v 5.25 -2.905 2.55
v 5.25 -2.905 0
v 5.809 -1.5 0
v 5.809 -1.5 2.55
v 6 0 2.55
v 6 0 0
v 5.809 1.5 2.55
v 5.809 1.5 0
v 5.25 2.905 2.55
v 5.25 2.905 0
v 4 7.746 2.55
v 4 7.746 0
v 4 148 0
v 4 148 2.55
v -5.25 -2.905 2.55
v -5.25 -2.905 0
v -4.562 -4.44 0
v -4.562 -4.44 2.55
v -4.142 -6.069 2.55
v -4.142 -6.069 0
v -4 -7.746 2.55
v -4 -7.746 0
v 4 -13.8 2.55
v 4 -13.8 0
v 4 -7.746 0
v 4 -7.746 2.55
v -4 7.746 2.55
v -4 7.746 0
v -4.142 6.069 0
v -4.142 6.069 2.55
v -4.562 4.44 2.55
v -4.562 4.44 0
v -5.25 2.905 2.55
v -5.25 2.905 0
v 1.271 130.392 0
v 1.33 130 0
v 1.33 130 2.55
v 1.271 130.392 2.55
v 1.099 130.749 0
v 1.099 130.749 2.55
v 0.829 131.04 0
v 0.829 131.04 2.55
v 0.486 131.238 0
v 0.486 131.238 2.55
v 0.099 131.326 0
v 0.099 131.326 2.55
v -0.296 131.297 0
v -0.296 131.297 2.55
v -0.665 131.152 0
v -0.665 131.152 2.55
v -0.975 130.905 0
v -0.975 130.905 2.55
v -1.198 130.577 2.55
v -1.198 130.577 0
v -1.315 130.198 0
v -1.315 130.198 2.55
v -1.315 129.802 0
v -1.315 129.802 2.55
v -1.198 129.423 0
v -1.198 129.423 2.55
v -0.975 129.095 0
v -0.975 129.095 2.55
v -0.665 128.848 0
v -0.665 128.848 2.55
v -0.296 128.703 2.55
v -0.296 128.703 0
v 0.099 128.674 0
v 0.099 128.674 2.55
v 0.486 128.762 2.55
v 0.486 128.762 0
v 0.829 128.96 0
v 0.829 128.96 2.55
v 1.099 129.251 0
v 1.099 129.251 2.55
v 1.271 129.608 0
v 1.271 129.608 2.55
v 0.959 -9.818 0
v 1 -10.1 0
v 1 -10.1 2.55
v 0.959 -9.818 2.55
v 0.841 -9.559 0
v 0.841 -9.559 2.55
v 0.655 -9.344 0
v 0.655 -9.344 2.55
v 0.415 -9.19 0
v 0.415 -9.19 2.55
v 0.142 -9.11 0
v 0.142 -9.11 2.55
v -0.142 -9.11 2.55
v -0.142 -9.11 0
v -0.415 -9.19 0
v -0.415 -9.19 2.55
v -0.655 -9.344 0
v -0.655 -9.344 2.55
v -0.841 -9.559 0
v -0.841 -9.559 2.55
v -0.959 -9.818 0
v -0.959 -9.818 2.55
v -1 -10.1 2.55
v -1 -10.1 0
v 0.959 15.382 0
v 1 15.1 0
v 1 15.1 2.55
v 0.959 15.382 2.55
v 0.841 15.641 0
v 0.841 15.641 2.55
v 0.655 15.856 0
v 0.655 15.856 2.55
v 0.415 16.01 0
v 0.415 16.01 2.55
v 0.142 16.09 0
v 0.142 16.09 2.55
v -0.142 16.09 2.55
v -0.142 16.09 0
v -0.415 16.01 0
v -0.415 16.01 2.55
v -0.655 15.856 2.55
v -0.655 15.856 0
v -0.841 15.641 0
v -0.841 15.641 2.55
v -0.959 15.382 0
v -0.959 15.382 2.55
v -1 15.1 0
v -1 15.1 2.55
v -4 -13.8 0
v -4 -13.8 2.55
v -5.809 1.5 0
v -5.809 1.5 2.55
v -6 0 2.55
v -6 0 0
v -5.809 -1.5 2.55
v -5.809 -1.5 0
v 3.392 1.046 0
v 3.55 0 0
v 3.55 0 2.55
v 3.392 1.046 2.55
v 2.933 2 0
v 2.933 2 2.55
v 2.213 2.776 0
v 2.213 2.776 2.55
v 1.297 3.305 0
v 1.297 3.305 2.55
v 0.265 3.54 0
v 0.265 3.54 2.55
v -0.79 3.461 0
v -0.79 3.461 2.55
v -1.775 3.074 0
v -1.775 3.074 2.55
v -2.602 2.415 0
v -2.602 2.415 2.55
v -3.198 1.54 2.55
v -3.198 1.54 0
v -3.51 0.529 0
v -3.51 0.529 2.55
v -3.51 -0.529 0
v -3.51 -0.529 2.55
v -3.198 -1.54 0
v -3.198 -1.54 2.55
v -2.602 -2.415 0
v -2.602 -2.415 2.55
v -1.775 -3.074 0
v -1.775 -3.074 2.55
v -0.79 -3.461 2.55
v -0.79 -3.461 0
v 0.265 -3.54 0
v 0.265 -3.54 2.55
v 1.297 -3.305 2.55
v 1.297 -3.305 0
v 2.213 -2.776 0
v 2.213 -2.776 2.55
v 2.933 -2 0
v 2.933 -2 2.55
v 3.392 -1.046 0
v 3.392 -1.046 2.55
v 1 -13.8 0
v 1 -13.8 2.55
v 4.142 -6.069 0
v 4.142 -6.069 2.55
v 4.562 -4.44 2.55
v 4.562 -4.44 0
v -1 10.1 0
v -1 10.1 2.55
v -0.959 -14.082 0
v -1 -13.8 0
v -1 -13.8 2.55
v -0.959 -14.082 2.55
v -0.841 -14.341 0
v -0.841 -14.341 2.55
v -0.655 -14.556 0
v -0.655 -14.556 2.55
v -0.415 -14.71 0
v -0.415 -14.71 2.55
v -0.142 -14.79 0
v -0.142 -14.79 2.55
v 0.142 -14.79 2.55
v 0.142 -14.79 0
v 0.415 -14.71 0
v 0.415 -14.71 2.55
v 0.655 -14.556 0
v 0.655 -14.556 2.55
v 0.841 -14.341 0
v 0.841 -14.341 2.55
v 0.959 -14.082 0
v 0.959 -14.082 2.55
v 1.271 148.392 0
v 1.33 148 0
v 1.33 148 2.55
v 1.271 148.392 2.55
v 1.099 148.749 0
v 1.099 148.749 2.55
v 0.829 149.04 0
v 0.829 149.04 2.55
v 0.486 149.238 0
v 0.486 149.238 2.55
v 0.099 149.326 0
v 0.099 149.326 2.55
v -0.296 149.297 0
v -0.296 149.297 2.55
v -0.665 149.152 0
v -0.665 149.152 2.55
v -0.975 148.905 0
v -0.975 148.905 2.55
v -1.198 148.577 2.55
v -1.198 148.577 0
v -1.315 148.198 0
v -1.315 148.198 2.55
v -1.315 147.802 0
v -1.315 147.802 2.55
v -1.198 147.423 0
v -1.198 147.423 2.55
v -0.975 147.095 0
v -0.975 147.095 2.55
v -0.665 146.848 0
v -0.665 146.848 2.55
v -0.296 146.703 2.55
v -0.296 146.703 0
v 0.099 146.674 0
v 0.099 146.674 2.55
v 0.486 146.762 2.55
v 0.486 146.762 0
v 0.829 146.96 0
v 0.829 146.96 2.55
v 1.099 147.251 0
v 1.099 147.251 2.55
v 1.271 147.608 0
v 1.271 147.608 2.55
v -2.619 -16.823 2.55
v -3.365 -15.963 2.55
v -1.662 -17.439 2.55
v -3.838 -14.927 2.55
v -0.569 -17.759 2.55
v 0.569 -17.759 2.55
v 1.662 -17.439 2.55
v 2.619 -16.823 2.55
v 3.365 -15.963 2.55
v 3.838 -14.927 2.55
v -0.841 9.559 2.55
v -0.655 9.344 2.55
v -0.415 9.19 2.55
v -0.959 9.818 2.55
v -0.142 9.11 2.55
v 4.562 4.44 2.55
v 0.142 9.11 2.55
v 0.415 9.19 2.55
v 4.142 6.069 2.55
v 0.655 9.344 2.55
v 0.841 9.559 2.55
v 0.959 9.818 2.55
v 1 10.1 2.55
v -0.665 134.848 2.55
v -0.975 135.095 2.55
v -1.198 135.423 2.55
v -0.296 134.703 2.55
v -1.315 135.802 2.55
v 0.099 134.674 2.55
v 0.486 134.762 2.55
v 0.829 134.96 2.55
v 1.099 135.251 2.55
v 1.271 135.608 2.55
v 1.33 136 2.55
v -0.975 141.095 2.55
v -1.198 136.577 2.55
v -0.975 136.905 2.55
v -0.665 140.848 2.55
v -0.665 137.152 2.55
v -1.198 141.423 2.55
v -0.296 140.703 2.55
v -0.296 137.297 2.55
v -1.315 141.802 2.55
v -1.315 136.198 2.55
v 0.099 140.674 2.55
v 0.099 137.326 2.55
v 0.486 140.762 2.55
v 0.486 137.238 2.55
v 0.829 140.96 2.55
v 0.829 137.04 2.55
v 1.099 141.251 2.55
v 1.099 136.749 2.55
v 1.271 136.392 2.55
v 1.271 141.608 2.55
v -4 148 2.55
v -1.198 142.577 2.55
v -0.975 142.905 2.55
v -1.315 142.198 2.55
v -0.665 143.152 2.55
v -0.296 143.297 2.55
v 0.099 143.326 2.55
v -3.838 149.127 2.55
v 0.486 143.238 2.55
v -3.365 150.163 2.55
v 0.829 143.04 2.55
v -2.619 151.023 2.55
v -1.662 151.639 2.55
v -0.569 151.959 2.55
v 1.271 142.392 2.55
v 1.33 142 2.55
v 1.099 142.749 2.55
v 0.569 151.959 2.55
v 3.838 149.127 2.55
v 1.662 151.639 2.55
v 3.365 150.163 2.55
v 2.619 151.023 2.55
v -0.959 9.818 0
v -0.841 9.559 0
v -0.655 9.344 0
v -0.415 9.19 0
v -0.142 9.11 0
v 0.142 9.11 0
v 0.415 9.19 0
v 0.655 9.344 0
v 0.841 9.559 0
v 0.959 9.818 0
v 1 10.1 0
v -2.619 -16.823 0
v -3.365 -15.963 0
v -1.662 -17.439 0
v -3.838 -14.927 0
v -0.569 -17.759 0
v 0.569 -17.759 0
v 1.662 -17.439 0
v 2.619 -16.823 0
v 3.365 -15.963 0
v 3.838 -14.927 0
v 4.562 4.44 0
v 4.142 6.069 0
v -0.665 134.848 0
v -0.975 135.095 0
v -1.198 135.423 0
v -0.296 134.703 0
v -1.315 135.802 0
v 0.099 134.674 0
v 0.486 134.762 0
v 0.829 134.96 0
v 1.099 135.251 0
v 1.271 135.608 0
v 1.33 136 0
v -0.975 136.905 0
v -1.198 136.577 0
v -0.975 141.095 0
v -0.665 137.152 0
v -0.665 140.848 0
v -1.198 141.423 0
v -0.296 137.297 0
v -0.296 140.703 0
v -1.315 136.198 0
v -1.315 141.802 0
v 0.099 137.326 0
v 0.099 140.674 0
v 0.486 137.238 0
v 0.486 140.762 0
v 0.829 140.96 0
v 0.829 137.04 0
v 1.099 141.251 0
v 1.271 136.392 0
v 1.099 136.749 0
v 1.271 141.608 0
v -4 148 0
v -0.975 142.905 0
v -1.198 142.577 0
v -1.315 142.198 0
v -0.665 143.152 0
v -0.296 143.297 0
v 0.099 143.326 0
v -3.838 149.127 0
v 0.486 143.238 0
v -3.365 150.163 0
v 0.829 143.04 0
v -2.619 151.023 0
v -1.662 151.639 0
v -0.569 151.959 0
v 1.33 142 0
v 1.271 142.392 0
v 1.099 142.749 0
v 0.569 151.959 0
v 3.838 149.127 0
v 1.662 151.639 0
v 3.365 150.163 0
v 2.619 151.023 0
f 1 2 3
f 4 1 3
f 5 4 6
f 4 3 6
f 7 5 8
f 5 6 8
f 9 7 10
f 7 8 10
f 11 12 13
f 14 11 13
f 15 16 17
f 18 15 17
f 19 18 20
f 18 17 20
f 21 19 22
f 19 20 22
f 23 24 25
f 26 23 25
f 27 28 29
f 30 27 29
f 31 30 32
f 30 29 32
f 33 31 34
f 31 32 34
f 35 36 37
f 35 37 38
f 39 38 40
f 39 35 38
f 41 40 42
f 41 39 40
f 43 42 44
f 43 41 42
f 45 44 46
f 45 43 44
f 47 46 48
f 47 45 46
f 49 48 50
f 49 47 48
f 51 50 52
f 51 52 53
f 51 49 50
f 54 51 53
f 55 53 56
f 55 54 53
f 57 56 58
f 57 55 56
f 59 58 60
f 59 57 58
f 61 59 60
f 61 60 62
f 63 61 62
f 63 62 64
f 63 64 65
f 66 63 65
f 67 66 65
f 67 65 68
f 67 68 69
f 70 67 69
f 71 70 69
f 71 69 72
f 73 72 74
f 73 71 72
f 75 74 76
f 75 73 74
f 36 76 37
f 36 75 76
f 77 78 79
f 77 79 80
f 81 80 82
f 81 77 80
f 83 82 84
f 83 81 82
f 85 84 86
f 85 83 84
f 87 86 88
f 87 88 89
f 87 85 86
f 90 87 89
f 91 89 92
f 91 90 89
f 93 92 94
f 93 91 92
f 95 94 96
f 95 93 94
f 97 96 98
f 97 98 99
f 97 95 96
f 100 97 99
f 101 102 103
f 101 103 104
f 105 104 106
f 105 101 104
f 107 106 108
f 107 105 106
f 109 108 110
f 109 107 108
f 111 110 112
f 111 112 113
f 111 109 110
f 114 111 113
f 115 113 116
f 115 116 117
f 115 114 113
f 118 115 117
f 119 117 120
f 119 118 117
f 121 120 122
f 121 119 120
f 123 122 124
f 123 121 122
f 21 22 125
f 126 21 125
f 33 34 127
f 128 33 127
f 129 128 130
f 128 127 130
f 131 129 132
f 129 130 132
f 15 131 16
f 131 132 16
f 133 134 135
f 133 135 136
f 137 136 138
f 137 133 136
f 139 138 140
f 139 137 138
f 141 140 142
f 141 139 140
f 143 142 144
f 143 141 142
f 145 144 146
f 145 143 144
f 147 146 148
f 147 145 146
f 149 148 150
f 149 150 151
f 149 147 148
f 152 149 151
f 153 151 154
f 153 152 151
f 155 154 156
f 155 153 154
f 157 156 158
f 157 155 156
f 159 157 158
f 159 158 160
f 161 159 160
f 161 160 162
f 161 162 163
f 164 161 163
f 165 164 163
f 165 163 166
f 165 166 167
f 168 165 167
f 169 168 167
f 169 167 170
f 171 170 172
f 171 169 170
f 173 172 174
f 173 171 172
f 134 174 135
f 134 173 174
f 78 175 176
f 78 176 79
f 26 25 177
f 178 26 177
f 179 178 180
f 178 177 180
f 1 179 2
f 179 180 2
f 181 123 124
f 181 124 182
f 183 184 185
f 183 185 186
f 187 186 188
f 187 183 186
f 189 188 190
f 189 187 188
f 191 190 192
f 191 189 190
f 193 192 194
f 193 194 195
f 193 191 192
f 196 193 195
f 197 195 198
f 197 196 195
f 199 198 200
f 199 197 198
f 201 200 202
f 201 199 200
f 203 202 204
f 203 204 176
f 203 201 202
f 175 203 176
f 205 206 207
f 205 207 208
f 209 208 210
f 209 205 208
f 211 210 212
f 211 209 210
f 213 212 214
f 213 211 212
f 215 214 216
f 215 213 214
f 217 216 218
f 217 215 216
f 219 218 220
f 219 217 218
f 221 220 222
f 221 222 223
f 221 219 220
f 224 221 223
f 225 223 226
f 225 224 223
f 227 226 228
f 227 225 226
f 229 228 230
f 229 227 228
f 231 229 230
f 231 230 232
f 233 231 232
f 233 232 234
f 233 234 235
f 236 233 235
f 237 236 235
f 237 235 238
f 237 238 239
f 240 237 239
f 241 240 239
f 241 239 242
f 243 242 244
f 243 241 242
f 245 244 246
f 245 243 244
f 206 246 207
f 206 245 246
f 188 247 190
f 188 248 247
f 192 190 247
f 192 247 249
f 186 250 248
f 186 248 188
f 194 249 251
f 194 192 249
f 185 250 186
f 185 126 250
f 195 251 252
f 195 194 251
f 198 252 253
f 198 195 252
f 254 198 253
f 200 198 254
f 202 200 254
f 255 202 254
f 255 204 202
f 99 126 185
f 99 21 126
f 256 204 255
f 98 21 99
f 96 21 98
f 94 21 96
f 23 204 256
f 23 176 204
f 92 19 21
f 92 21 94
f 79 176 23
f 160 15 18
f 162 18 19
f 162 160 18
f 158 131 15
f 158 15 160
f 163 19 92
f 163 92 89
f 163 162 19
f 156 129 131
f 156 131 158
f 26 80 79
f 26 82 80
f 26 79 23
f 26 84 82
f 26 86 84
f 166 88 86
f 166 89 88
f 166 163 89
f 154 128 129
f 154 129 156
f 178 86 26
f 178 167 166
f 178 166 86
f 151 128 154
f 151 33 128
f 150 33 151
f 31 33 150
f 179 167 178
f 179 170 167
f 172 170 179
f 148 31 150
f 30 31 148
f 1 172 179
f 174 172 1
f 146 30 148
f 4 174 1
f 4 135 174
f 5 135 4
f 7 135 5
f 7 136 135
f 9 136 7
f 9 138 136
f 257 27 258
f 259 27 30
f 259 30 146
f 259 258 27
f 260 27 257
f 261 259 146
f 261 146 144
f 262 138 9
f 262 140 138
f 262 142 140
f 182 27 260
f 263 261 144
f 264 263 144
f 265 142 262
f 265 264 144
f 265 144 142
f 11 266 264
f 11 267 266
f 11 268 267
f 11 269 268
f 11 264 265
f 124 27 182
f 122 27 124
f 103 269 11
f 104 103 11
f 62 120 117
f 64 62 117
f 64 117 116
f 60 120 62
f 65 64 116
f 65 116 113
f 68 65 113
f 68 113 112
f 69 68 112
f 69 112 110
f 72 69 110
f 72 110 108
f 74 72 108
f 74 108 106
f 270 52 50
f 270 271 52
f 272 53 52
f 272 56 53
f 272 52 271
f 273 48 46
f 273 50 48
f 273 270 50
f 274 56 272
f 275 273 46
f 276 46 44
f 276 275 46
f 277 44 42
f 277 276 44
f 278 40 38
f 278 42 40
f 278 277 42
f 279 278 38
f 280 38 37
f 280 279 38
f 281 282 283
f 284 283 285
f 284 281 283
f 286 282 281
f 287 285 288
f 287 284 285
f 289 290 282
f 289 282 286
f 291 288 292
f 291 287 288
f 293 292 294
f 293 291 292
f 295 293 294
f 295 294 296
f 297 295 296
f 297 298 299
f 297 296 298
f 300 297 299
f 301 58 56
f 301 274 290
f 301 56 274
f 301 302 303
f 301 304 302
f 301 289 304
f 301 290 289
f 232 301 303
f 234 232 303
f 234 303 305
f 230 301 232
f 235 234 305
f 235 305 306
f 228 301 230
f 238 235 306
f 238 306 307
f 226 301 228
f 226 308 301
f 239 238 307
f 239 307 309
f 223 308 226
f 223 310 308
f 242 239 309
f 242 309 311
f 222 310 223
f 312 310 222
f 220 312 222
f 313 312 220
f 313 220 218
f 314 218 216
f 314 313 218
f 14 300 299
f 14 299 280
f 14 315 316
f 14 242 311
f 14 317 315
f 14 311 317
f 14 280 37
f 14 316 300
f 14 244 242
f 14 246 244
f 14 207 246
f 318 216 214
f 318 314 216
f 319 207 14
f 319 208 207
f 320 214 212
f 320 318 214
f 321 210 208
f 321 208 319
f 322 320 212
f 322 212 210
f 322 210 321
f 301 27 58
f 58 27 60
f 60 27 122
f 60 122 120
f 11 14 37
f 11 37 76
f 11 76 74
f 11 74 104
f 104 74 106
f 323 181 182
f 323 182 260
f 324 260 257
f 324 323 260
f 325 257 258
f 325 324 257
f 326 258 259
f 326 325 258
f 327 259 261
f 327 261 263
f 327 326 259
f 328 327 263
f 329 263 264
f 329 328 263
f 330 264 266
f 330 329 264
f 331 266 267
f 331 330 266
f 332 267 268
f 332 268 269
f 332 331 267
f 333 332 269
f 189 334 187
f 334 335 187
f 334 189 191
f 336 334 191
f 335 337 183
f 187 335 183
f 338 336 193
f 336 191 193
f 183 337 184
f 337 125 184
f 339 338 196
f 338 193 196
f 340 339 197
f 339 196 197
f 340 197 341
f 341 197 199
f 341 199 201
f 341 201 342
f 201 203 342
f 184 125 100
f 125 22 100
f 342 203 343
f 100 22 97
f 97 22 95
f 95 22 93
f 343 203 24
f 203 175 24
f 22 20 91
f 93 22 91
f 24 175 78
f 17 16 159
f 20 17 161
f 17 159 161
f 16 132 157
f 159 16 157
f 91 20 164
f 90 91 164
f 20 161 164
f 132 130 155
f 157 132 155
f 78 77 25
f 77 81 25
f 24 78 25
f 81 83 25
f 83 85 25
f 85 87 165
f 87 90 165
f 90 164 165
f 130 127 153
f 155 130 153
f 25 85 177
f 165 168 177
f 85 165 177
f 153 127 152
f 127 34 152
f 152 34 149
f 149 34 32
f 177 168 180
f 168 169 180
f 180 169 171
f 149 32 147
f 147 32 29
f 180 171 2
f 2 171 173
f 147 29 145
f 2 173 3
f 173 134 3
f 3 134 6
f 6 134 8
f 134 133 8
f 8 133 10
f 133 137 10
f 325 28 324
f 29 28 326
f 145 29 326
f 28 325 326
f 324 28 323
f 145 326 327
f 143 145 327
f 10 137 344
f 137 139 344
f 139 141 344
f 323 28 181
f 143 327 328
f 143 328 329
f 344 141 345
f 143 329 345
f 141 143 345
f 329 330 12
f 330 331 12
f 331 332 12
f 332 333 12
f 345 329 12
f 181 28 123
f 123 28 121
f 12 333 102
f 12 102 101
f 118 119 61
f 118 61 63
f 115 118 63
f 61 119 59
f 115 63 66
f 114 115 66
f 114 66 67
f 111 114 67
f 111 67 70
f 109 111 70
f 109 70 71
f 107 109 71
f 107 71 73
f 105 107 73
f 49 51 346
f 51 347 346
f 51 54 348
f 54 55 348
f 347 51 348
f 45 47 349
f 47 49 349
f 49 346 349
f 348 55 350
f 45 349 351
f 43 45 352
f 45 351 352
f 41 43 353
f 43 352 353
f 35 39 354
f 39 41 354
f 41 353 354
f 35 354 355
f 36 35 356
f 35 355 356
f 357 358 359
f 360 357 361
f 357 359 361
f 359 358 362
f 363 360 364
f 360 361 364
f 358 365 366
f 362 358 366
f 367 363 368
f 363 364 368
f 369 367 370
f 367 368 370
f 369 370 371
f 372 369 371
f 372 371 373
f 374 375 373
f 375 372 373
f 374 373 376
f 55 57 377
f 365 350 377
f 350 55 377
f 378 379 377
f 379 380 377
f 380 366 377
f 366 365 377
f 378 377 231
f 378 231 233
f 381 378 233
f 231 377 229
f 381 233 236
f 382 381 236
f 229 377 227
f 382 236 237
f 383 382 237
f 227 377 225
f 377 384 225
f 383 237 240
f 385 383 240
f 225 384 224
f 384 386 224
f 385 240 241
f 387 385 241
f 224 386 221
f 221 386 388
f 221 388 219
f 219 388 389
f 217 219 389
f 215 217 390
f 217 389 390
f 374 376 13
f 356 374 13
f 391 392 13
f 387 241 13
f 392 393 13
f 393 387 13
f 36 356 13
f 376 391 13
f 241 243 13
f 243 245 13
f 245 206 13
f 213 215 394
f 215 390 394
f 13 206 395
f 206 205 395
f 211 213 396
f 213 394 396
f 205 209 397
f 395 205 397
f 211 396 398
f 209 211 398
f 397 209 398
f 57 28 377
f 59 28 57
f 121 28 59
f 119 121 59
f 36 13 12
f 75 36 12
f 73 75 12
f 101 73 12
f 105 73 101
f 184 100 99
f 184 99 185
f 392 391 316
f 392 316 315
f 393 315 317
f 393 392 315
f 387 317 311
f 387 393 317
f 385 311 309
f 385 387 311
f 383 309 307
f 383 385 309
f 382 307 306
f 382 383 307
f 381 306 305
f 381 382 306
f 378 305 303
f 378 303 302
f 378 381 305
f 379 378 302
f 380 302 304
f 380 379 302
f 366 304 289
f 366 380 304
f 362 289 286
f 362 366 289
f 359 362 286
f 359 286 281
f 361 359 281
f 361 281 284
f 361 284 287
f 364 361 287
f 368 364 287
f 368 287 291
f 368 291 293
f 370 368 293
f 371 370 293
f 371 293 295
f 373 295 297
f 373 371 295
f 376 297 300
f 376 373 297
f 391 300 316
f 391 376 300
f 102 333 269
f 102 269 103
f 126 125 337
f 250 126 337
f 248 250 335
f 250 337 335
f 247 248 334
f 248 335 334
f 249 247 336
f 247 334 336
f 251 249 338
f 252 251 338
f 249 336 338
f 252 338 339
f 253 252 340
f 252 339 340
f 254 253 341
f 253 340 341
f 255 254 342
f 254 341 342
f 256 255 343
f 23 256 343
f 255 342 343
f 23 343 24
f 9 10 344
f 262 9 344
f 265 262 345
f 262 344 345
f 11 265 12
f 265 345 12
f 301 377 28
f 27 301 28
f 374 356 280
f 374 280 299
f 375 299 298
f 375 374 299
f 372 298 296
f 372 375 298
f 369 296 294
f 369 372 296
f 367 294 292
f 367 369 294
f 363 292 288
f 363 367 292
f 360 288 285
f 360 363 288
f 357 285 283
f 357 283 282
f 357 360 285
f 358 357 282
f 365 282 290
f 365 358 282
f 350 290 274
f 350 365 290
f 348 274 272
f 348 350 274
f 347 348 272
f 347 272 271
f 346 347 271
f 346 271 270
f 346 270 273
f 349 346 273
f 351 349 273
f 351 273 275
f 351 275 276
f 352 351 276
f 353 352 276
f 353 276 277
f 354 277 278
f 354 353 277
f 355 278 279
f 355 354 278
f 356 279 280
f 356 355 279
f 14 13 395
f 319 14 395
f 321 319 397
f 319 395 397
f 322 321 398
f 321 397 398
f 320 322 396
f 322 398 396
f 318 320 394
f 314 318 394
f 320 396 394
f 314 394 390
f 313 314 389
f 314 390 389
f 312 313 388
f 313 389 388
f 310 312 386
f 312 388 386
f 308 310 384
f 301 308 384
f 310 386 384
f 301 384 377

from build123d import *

# Parameters (mm, degrees)
MODEL_R             = 3.55
MODEL_R_2           = 1.33
BOSS_EXTRUDE1_DEPTH = 2.55


with BuildPart() as part:
    # Model → Boss-Extrude1 (new body)
    with BuildSketch(Plane.XY):
        with BuildLine():
            Line((-4, 148), (-4, 7.745966692))
            ThreePointArc((-4, 7.745966692), (-4.317541634, 5.245966692), (-5.25, 2.90473751))
            ThreePointArc((-5.25, 2.90473751), (-6, 0), (-5.25, -2.90473751))
            ThreePointArc((-5.25, -2.90473751), (-4.317541634, -5.245966692), (-4, -7.745966692))
            Line((-4, -7.745966692), (-4, -13.8))
            ThreePointArc((-4, -13.8), (0, -17.8), (4, -13.8))
            Line((4, -13.8), (4, -7.745966692))
            ThreePointArc((4, -7.745966692), (4.317541634, -5.245966692), (5.25, -2.90473751))
            ThreePointArc((5.25, -2.90473751), (6, 0), (5.25, 2.90473751))
            ThreePointArc((5.25, 2.90473751), (4.317541634, 5.245966692), (4, 7.745966692))
            Line((4, 7.745966692), (4, 148))
            ThreePointArc((4, 148), (0, 152), (-4, 148))
        make_face()
        Circle(MODEL_R, mode=Mode.SUBTRACT)
        with Locations((0, 148)):
            Circle(MODEL_R_2, mode=Mode.SUBTRACT)
        with Locations((0, 142)):
            Circle(MODEL_R_2, mode=Mode.SUBTRACT)
        with Locations((0, 136)):
            Circle(MODEL_R_2, mode=Mode.SUBTRACT)
        with Locations((0, 130)):
            Circle(MODEL_R_2, mode=Mode.SUBTRACT)
        with BuildLine():
            Line((-1, -10.1), (-1, -13.8))
            ThreePointArc((-1, -13.8), (0, -14.8), (1, -13.8))
            Line((1, -13.8), (1, -10.1))
            ThreePointArc((1, -10.1), (0, -9.1), (-1, -10.1))
        make_face(mode=Mode.SUBTRACT)
        with BuildLine():
            Line((-1, 15.1), (-1, 10.1))
            ThreePointArc((-1, 10.1), (0, 9.1), (1, 10.1))
            Line((1, 10.1), (1, 15.1))
            ThreePointArc((1, 15.1), (0, 16.1), (-1, 15.1))
        make_face(mode=Mode.SUBTRACT)
    extrude(amount=BOSS_EXTRUDE1_DEPTH)


solid = part.part
